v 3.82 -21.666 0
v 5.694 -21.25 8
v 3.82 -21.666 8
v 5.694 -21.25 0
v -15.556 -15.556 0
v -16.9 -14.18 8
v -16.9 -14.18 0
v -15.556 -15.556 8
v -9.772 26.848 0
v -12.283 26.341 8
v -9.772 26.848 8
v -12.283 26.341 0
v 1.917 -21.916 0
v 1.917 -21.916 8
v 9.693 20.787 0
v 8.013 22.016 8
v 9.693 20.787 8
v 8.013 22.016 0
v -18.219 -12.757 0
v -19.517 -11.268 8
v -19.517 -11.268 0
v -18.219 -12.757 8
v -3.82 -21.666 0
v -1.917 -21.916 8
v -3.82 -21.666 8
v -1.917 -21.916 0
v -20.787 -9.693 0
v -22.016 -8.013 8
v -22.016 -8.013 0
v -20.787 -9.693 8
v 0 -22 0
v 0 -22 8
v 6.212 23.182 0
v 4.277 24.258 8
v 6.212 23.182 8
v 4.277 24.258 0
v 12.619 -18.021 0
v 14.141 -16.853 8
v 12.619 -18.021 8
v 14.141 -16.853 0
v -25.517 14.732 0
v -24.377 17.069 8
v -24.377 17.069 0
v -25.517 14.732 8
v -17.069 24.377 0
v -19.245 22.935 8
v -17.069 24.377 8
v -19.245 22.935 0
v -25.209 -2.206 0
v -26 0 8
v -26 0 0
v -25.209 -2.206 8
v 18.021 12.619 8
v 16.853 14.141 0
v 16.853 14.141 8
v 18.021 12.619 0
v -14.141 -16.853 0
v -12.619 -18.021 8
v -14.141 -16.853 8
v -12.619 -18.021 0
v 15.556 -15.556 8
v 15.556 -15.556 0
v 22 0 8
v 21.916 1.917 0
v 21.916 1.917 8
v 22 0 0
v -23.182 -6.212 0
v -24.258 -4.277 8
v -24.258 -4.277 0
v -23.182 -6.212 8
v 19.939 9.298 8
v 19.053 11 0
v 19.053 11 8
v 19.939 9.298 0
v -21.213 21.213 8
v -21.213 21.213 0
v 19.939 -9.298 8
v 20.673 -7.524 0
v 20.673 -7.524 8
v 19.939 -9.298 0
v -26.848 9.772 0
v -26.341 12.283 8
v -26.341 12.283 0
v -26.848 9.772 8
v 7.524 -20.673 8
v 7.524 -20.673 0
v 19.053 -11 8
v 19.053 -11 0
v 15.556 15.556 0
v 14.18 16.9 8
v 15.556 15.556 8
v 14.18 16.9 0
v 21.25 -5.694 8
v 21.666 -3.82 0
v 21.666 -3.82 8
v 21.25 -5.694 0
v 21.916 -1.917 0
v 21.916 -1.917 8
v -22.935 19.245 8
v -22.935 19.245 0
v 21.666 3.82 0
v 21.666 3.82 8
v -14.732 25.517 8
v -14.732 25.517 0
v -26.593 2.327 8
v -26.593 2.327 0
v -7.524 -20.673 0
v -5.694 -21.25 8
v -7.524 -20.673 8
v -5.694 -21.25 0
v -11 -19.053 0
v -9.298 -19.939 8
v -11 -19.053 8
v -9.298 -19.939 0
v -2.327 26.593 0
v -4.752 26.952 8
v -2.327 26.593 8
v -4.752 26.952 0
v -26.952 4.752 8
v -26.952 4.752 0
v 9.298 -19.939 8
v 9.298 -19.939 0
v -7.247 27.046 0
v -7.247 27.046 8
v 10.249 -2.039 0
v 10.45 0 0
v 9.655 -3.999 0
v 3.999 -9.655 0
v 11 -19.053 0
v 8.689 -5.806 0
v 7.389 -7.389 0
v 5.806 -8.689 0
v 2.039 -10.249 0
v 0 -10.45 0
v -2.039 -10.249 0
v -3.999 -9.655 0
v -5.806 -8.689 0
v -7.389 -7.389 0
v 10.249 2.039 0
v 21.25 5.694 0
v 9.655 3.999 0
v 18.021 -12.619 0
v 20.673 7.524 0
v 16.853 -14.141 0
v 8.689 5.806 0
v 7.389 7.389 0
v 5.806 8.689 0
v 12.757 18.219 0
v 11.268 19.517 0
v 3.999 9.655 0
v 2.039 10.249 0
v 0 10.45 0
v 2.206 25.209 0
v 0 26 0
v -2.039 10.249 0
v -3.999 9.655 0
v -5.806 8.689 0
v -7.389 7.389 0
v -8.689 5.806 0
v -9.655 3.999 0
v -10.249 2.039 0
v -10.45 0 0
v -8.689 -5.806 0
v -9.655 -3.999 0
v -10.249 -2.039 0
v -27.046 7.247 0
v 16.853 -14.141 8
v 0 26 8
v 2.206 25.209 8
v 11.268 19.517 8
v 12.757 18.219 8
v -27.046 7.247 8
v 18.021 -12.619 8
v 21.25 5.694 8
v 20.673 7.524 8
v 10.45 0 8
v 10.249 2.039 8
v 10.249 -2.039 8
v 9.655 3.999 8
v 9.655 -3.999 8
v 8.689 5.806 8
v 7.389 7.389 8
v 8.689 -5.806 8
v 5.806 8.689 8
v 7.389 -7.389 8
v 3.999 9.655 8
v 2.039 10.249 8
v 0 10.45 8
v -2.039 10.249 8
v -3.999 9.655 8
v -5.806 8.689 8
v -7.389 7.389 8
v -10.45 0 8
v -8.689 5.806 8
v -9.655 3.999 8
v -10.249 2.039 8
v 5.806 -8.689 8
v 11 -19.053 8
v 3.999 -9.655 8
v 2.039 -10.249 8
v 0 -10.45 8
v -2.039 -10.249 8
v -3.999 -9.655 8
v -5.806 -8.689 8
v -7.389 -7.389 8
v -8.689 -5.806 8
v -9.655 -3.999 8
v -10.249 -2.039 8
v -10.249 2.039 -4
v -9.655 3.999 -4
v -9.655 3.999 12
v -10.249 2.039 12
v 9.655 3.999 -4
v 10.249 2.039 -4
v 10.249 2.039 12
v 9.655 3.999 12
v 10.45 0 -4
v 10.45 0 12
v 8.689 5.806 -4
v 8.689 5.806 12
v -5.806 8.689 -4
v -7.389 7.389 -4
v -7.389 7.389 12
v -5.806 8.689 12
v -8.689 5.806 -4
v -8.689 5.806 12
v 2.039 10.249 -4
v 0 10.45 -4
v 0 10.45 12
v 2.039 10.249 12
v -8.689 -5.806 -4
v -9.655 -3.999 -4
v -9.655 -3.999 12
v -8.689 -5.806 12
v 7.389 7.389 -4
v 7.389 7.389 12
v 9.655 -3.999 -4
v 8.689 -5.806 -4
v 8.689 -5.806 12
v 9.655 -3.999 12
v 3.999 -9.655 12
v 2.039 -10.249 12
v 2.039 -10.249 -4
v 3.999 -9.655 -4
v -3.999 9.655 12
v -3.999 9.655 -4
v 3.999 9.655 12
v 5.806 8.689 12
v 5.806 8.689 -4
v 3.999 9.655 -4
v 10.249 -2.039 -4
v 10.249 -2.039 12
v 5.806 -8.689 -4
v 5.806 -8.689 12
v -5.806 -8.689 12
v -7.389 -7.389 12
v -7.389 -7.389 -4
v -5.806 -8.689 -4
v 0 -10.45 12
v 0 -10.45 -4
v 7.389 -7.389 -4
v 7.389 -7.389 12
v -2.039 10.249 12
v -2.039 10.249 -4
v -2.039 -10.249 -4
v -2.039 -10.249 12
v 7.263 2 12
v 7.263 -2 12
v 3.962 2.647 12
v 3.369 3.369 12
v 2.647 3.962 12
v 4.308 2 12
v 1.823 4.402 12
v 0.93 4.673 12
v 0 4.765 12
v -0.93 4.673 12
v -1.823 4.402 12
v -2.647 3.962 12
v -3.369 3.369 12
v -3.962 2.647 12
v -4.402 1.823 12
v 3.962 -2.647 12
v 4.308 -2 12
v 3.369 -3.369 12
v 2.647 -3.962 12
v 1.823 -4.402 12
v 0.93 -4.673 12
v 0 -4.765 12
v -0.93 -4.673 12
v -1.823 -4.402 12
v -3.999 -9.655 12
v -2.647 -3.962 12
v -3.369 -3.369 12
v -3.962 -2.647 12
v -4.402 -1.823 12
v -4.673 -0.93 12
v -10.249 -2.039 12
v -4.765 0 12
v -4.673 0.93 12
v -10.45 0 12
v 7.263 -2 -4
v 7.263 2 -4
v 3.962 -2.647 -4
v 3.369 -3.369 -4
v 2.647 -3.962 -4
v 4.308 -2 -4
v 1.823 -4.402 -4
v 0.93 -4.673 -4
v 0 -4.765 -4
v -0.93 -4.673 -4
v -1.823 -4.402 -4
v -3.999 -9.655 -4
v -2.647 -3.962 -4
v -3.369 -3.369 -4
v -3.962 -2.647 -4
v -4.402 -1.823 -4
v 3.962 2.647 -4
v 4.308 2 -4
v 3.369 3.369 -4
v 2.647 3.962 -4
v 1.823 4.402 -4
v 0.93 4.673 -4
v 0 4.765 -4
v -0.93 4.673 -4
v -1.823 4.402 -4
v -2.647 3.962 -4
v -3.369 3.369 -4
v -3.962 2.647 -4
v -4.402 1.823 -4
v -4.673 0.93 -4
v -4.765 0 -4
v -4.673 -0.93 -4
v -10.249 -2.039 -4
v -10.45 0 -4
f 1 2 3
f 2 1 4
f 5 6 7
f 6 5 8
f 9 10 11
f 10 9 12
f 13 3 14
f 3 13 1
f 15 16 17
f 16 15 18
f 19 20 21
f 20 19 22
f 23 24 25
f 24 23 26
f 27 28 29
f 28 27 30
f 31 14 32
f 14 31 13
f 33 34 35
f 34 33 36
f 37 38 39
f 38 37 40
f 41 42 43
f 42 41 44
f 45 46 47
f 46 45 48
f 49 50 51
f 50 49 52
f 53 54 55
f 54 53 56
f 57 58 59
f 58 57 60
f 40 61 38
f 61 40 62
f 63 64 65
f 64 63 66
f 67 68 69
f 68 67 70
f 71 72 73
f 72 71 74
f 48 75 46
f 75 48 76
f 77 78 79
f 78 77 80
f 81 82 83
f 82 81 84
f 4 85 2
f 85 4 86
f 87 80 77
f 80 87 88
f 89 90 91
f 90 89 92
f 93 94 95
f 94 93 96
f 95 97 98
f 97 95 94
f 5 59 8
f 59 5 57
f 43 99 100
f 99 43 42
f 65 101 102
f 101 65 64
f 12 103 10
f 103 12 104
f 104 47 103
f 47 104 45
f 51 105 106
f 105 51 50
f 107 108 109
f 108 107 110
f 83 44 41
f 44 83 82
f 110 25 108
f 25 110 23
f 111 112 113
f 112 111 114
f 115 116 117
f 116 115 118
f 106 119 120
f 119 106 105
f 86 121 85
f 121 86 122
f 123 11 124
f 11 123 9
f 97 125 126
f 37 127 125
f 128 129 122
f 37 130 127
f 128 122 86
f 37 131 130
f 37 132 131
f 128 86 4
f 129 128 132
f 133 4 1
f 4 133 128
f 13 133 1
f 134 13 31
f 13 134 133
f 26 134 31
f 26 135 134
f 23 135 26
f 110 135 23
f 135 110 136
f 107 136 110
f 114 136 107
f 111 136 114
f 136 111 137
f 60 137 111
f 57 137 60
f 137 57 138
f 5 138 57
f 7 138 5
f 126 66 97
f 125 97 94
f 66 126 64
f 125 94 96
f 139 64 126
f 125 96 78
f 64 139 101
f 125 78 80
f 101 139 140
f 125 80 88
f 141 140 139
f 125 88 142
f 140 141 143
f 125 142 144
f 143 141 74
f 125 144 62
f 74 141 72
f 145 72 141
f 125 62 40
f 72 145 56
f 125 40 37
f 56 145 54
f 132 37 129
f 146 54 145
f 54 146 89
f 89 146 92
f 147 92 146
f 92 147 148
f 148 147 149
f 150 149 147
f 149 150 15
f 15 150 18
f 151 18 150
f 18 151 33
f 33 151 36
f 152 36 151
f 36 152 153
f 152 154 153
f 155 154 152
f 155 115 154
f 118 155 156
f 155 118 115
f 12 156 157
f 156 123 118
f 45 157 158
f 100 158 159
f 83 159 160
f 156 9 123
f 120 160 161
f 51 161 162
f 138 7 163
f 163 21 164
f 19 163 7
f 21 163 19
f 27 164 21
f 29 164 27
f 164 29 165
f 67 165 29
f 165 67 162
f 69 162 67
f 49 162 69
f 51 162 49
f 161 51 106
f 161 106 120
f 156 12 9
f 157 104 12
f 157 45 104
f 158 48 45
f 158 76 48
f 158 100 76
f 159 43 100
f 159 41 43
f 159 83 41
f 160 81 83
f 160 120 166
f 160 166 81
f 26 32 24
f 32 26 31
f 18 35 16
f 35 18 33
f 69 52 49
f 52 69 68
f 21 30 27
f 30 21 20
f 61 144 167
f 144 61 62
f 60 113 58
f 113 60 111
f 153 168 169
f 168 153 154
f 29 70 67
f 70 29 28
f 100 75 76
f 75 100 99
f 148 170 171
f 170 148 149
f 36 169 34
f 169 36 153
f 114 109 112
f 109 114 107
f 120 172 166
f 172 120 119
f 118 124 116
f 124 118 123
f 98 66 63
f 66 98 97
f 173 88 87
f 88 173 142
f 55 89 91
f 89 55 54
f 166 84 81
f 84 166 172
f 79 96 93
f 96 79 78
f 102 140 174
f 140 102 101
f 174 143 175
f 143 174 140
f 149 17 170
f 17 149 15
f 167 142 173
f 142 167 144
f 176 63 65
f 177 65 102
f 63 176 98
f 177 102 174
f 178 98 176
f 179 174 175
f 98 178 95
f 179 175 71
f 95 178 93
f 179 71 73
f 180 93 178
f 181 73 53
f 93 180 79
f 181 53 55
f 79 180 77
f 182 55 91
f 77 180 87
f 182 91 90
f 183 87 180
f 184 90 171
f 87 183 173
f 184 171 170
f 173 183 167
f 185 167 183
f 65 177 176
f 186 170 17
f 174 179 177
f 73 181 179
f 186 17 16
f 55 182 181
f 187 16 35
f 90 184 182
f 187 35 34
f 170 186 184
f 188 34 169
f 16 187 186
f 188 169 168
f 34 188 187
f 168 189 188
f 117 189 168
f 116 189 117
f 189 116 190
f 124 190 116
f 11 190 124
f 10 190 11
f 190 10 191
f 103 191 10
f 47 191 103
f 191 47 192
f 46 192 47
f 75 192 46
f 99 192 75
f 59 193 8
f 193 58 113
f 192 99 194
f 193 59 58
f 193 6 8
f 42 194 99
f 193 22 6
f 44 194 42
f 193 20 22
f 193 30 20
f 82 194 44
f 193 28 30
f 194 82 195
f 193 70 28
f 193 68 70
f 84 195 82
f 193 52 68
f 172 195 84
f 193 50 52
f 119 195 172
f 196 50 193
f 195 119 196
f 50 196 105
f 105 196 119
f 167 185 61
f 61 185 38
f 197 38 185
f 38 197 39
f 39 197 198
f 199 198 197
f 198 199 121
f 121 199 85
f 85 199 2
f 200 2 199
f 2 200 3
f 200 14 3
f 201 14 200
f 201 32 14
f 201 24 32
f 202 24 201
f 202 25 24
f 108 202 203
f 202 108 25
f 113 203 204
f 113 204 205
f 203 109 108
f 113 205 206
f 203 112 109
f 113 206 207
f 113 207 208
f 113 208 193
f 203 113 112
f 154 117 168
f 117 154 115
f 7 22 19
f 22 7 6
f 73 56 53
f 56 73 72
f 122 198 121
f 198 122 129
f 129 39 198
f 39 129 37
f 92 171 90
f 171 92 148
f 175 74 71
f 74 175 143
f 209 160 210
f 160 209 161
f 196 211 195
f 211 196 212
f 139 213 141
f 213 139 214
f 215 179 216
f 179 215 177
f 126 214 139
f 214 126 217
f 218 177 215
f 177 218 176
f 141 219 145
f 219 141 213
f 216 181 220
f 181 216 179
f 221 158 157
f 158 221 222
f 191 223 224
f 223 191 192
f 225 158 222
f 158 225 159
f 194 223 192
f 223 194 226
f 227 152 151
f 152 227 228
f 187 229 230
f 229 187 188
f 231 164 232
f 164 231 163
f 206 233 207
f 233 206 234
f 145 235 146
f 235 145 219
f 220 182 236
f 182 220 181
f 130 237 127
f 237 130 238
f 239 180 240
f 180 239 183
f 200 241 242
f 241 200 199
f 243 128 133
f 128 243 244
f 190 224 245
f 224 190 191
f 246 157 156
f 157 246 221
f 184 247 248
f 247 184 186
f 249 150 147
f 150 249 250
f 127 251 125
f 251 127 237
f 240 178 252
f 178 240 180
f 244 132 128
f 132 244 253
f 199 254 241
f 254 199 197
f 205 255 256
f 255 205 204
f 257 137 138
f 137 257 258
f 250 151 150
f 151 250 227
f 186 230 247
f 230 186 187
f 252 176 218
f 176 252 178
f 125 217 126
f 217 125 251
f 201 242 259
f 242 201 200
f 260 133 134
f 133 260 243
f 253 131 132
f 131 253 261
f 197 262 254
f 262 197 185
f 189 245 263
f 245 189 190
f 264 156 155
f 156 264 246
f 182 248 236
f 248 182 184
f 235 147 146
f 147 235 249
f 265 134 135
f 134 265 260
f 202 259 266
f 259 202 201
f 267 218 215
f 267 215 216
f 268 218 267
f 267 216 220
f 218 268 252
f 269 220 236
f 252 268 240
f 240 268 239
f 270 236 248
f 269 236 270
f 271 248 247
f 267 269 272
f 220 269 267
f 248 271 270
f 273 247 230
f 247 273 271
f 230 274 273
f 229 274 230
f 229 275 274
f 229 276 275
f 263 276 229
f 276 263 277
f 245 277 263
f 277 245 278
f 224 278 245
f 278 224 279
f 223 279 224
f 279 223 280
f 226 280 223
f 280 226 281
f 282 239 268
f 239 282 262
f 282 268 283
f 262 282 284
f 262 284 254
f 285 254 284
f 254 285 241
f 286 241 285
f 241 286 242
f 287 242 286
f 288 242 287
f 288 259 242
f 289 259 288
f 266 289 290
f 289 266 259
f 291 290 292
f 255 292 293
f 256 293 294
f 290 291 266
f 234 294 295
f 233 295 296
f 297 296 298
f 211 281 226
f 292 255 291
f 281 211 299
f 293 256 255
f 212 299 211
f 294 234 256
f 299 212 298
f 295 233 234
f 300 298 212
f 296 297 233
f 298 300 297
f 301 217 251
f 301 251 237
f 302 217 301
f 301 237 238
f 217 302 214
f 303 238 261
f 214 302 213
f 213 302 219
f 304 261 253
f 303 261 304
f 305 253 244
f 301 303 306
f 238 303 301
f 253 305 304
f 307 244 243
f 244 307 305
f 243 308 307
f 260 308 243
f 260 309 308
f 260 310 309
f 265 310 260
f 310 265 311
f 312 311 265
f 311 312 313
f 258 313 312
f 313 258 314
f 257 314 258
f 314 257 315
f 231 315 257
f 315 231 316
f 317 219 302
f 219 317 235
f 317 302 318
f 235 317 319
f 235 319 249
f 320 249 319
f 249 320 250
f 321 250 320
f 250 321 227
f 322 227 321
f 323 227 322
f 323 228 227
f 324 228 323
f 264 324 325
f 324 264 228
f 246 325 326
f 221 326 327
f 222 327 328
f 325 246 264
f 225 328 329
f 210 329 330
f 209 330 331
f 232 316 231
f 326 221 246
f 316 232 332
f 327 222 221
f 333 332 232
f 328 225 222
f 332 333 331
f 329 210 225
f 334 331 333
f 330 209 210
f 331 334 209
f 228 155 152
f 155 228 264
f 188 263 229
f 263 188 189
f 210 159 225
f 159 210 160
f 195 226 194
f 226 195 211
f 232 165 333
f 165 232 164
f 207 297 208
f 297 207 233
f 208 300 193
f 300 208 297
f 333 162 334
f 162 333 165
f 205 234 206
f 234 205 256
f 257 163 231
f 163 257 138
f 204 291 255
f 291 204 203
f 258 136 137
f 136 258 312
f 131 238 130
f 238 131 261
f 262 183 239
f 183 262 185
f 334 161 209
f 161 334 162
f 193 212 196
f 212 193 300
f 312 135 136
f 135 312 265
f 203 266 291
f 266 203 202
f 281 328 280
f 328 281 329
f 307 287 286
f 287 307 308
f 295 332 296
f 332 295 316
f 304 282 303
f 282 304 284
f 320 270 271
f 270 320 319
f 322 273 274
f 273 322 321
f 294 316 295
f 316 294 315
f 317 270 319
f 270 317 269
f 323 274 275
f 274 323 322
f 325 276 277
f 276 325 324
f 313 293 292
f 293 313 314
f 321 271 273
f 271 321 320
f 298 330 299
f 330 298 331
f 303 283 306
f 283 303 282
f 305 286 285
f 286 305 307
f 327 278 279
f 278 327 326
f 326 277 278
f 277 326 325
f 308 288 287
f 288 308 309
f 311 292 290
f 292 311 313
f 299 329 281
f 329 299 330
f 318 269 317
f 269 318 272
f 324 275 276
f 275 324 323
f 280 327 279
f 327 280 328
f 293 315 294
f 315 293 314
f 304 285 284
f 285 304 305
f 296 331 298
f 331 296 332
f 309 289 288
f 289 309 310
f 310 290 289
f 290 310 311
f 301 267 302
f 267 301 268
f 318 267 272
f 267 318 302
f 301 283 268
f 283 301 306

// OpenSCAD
$fn = 32;

// ----------------------------------------------------------------------
// Cam: base radius 22 mm with a 8 mm lift over 180 degrees
// ----------------------------------------------------------------------

// --- parameters (mm) ---
base_r = 22;              // base radius
lift = 8;                 // lift height above the base radius
lift_span = 180;          // angular width of the lift
lift_start = 45;          // angle where the lift starts
cam_t = 8;                // cam plate thickness
hub_d = 20.9;             // hub diameter
hub_h = 16;               // hub height
bore_d = 9.53;            // bore
key_w = 4;                // keyway width
key_depth = 2;            // keyway depth

cam_profile = [[22, 0], [21.916, 1.917], [21.666, 3.82], [21.25, 5.694], [20.673, 7.524], [19.939, 9.298], [19.053, 11], [18.021, 12.619], [16.853, 14.141], [15.556, 15.556], [14.18, 16.9], [12.757, 18.219], [11.268, 19.517], [9.693, 20.787], [8.013, 22.016], [6.212, 23.182], [4.277, 24.258], [2.206, 25.209], [0, 26], [-2.327, 26.593], [-4.752, 26.952], [-7.247, 27.046], [-9.772, 26.848], [-12.283, 26.341], [-14.732, 25.517], [-17.069, 24.377], [-19.245, 22.935], [-21.213, 21.213], [-22.935, 19.245], [-24.377, 17.069], [-25.517, 14.732], [-26.341, 12.283], [-26.848, 9.772], [-27.046, 7.247], [-26.952, 4.752], [-26.593, 2.327], [-26, 0], [-25.209, -2.206], [-24.258, -4.277], [-23.182, -6.212], [-22.016, -8.013], [-20.787, -9.693], [-19.517, -11.268], [-18.219, -12.757], [-16.9, -14.18], [-15.556, -15.556], [-14.141, -16.853], [-12.619, -18.021], [-11, -19.053], [-9.298, -19.939], [-7.524, -20.673], [-5.694, -21.25], [-3.82, -21.666], [-1.917, -21.916], [0, -22], [1.917, -21.916], [3.82, -21.666], [5.694, -21.25], [7.524, -20.673], [9.298, -19.939], [11, -19.053], [12.619, -18.021], [14.141, -16.853], [15.556, -15.556], [16.853, -14.141], [18.021, -12.619], [19.053, -11], [19.939, -9.298], [20.673, -7.524], [21.25, -5.694], [21.666, -3.82], [21.916, -1.917]];

difference() {
  union() {
    linear_extrude(height = cam_t) polygon(cam_profile);
    /* hub, proud of the cam plate on both sides */
    translate([0, 0, -4]) cylinder(h = hub_h, d = hub_d);
  }
  /* bore through the hub, 2.5 mm clear on both faces */
  translate([0, 0, -6.5]) cylinder(h = hub_h + 5, d = bore_d);
  /* keyway, milled through the whole hub */
  translate([2.763, -2, -6.5]) cube([4.5, 4, 21]);
}
